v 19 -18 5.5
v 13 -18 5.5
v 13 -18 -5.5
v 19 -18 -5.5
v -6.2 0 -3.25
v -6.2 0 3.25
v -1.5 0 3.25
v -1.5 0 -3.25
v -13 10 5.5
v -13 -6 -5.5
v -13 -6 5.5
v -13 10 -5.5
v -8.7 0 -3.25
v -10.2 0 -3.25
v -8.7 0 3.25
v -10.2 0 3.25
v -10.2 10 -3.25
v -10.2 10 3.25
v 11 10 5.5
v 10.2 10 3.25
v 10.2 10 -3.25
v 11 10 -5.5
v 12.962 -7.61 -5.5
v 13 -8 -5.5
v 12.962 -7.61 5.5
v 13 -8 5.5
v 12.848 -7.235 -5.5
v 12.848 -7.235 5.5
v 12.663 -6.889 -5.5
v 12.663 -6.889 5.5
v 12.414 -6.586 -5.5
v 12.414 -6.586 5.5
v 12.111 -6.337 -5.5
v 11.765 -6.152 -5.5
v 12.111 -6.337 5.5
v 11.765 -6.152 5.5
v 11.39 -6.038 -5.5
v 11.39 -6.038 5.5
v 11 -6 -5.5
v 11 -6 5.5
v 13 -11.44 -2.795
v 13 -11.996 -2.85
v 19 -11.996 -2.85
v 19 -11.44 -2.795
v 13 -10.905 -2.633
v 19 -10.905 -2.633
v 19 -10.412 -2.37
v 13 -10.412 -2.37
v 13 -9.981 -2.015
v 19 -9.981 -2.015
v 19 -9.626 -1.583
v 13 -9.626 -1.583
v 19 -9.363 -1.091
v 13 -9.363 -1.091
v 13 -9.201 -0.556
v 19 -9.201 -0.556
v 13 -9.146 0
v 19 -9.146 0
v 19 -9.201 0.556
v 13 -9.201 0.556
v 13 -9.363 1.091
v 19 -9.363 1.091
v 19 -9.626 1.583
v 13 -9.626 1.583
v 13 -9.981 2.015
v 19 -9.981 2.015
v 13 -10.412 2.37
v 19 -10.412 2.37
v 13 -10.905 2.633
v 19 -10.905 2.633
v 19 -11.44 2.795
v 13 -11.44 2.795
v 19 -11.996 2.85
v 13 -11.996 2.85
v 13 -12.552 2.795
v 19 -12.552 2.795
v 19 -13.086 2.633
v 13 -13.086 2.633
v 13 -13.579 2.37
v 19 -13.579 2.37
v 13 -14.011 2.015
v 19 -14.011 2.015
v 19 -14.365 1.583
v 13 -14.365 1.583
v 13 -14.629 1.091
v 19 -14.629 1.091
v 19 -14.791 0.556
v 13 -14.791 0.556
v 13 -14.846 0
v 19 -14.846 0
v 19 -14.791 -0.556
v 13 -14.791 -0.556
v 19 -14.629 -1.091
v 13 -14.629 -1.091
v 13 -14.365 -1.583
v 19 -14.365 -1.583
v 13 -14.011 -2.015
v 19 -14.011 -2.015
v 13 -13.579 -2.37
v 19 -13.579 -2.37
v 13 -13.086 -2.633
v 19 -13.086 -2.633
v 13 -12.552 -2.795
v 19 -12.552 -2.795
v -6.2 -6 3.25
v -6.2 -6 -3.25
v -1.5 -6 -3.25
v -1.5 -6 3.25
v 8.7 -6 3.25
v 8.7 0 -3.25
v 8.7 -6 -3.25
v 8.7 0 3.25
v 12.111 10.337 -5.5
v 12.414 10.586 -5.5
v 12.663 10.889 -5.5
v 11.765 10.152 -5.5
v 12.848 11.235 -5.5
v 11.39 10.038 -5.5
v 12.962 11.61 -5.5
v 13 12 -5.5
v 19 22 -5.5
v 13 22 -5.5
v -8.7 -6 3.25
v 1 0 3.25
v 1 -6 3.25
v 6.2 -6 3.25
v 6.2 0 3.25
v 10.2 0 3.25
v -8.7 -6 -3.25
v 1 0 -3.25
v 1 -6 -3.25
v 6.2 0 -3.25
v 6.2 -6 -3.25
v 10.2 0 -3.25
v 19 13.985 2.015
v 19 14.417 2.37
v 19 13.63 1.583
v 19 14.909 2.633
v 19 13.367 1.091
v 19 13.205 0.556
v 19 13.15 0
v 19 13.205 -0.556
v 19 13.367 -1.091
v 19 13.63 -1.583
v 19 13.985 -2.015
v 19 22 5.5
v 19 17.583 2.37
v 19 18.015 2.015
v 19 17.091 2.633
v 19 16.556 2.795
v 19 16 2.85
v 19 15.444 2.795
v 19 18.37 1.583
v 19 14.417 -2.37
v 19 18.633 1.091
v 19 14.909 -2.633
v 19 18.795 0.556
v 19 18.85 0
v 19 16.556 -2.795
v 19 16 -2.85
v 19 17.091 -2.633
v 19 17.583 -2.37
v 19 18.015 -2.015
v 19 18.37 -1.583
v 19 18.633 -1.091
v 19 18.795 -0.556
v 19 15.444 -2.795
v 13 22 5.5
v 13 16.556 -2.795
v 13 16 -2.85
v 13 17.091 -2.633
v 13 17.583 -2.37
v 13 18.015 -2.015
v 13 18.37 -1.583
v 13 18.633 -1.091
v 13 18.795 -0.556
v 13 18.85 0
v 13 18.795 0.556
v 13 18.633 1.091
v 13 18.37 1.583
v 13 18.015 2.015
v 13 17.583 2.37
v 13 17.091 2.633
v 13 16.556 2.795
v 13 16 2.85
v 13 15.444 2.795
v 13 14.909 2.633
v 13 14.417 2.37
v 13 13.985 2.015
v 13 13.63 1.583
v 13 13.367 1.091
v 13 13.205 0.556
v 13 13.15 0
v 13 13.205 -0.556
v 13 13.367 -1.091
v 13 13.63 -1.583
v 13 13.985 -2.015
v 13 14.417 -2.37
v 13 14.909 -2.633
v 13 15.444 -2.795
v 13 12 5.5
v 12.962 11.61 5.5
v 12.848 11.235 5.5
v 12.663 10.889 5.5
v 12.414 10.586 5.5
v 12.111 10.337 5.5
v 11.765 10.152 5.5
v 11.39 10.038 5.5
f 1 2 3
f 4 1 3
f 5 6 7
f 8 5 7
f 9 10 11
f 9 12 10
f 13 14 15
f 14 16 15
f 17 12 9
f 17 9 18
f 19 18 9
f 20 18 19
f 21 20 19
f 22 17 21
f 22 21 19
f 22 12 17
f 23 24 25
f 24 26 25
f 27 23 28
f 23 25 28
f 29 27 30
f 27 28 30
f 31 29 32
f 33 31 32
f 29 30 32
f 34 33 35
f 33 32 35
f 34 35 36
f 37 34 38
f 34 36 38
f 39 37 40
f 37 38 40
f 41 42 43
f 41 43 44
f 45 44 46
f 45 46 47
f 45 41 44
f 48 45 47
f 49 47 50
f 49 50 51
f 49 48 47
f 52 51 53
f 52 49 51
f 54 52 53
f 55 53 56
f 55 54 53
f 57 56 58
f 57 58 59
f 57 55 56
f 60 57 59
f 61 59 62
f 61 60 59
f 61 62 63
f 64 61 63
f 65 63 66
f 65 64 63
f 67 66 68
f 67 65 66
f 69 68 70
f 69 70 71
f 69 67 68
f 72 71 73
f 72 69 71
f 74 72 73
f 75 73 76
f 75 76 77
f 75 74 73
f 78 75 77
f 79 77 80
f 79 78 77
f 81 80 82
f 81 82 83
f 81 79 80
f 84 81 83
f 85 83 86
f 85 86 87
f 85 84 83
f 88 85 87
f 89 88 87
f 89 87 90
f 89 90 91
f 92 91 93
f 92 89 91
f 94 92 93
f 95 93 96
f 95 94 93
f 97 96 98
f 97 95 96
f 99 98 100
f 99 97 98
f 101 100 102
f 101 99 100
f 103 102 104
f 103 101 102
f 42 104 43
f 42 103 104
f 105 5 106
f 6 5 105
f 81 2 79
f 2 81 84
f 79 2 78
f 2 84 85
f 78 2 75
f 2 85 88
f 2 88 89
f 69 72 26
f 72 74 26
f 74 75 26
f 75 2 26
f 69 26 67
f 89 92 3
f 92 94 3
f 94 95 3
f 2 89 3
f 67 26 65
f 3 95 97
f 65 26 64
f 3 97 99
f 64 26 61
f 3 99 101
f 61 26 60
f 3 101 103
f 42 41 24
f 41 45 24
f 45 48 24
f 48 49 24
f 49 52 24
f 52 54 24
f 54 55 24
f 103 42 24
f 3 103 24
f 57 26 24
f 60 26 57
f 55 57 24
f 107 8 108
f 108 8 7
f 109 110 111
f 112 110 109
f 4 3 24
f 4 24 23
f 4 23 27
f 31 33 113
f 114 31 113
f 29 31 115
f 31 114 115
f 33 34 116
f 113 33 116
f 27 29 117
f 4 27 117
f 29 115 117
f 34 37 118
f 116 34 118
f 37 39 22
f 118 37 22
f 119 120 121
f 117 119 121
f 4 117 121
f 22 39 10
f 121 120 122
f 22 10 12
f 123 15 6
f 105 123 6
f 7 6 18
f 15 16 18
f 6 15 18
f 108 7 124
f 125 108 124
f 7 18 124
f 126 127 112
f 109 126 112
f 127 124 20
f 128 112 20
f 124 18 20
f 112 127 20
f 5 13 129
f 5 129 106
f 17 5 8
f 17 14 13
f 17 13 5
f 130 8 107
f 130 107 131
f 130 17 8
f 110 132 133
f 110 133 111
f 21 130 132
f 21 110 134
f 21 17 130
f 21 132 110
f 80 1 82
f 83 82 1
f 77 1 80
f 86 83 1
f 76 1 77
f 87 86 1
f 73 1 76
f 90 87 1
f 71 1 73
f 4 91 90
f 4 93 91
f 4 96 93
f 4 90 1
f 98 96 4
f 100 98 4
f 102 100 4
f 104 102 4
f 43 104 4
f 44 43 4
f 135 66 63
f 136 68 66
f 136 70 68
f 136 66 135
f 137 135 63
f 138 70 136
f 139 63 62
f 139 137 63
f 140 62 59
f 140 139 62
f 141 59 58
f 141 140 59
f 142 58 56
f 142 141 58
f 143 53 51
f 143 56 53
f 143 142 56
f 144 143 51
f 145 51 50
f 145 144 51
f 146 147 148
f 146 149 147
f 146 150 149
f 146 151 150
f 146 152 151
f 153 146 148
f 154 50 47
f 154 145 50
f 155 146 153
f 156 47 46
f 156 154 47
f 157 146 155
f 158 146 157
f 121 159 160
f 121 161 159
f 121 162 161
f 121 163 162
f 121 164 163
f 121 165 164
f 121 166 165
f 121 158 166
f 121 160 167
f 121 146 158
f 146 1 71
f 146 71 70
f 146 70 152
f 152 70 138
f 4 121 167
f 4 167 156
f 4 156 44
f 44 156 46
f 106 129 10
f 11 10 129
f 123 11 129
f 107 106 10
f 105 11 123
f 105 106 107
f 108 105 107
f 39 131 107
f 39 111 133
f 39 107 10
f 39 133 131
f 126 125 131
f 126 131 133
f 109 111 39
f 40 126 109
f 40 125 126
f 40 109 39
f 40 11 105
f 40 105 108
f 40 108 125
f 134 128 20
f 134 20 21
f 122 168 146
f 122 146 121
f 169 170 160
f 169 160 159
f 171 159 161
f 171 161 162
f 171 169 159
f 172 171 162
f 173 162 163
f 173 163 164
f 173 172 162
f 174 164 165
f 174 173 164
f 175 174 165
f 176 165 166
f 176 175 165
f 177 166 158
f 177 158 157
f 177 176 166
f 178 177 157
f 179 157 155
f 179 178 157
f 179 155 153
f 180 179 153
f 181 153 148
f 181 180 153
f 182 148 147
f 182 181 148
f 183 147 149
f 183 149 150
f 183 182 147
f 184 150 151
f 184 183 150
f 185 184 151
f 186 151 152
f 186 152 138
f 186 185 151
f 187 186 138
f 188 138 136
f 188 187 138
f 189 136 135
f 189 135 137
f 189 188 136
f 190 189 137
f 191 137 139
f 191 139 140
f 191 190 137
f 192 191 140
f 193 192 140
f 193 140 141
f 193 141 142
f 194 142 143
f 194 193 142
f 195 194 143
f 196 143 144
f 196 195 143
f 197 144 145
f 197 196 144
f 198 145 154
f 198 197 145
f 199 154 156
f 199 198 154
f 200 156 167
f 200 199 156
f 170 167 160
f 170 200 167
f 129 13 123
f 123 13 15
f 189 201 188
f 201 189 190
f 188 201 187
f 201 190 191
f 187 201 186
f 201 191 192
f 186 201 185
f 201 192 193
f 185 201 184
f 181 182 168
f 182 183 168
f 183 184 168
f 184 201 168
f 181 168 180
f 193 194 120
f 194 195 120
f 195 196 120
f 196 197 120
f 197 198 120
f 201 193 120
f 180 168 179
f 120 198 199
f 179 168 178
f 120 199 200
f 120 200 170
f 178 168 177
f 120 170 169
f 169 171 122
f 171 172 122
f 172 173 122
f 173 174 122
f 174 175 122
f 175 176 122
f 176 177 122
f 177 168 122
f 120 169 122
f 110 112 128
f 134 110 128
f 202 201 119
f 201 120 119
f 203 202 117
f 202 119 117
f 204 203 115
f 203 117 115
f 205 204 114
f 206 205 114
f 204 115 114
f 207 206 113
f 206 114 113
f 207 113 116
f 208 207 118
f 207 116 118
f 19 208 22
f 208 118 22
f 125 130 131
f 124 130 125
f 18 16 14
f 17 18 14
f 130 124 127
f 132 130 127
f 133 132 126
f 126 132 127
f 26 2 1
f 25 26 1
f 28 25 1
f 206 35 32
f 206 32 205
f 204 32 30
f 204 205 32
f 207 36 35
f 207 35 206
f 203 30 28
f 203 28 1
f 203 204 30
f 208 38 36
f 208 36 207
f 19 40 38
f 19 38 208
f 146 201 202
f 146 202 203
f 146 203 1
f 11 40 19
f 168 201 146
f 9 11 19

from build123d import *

# Parameters (mm, degrees)
SKETCH2_W           = 26
SKETCH2_H           = 11
SKETCH2_W_2         = 20.4
SKETCH2_H_2         = 6.5
BOSS_EXTRUDE1_DEPTH = 10
SKETCH3_W           = 26
SKETCH3_H           = 11
SKETCH3_W_2         = 2.5
SKETCH3_H_2         = 6.5
BOSS_EXTRUDE2_DEPTH = 6
SKETCH4_W           = 11
SKETCH4_H           = 40
SKETCH4_R           = 2.85
BOSS_EXTRUDE3_DEPTH = 6
FILLET1_R           = 2


with BuildPart() as part:
    # Sketch2 → Boss-Extrude1 (new body)
    with BuildSketch(Plane(origin=(0, 0, 0), x_dir=(1, 0, 0), z_dir=(0, 1, 0))):
        Rectangle(SKETCH2_W, SKETCH2_H)
        Rectangle(SKETCH2_W_2, SKETCH2_H_2, mode=Mode.SUBTRACT)
    extrude(amount=BOSS_EXTRUDE1_DEPTH)

    # Sketch3 → Boss-Extrude2 (add)
    with BuildSketch(Plane.XZ):
        Rectangle(SKETCH3_W, SKETCH3_H)
        with Locations((-7.45, 0)):
            Rectangle(SKETCH3_W_2, SKETCH3_H_2, mode=Mode.SUBTRACT)
        with Locations((-0.25, 0)):
            Rectangle(SKETCH3_W_2, SKETCH3_H_2, mode=Mode.SUBTRACT)
        with Locations((7.45, 0)):
            Rectangle(SKETCH3_W_2, SKETCH3_H_2, mode=Mode.SUBTRACT)
    extrude(amount=BOSS_EXTRUDE2_DEPTH)

    # Sketch4 → Boss-Extrude3 (add)
    with BuildSketch(Plane(origin=(13, 0, 0), x_dir=(0, 0, -1), z_dir=(1, 0, 0))):
        with Locations((0, 2)):
            Rectangle(SKETCH4_W, SKETCH4_H)
        with Locations((0, 16)):
            Circle(SKETCH4_R, mode=Mode.SUBTRACT)
        with Locations((0, -11.995757917)):
            Circle(SKETCH4_R, mode=Mode.SUBTRACT)
    extrude(amount=BOSS_EXTRUDE3_DEPTH)

    # Fillet1
    fillet1_edges = [part.edges().sort_by_distance(p)[0] for p in [
        (13, -6, 0),
        (13, 10, 0),
    ]]
    fillet(fillet1_edges, radius=FILLET1_R)


solid = part.part
